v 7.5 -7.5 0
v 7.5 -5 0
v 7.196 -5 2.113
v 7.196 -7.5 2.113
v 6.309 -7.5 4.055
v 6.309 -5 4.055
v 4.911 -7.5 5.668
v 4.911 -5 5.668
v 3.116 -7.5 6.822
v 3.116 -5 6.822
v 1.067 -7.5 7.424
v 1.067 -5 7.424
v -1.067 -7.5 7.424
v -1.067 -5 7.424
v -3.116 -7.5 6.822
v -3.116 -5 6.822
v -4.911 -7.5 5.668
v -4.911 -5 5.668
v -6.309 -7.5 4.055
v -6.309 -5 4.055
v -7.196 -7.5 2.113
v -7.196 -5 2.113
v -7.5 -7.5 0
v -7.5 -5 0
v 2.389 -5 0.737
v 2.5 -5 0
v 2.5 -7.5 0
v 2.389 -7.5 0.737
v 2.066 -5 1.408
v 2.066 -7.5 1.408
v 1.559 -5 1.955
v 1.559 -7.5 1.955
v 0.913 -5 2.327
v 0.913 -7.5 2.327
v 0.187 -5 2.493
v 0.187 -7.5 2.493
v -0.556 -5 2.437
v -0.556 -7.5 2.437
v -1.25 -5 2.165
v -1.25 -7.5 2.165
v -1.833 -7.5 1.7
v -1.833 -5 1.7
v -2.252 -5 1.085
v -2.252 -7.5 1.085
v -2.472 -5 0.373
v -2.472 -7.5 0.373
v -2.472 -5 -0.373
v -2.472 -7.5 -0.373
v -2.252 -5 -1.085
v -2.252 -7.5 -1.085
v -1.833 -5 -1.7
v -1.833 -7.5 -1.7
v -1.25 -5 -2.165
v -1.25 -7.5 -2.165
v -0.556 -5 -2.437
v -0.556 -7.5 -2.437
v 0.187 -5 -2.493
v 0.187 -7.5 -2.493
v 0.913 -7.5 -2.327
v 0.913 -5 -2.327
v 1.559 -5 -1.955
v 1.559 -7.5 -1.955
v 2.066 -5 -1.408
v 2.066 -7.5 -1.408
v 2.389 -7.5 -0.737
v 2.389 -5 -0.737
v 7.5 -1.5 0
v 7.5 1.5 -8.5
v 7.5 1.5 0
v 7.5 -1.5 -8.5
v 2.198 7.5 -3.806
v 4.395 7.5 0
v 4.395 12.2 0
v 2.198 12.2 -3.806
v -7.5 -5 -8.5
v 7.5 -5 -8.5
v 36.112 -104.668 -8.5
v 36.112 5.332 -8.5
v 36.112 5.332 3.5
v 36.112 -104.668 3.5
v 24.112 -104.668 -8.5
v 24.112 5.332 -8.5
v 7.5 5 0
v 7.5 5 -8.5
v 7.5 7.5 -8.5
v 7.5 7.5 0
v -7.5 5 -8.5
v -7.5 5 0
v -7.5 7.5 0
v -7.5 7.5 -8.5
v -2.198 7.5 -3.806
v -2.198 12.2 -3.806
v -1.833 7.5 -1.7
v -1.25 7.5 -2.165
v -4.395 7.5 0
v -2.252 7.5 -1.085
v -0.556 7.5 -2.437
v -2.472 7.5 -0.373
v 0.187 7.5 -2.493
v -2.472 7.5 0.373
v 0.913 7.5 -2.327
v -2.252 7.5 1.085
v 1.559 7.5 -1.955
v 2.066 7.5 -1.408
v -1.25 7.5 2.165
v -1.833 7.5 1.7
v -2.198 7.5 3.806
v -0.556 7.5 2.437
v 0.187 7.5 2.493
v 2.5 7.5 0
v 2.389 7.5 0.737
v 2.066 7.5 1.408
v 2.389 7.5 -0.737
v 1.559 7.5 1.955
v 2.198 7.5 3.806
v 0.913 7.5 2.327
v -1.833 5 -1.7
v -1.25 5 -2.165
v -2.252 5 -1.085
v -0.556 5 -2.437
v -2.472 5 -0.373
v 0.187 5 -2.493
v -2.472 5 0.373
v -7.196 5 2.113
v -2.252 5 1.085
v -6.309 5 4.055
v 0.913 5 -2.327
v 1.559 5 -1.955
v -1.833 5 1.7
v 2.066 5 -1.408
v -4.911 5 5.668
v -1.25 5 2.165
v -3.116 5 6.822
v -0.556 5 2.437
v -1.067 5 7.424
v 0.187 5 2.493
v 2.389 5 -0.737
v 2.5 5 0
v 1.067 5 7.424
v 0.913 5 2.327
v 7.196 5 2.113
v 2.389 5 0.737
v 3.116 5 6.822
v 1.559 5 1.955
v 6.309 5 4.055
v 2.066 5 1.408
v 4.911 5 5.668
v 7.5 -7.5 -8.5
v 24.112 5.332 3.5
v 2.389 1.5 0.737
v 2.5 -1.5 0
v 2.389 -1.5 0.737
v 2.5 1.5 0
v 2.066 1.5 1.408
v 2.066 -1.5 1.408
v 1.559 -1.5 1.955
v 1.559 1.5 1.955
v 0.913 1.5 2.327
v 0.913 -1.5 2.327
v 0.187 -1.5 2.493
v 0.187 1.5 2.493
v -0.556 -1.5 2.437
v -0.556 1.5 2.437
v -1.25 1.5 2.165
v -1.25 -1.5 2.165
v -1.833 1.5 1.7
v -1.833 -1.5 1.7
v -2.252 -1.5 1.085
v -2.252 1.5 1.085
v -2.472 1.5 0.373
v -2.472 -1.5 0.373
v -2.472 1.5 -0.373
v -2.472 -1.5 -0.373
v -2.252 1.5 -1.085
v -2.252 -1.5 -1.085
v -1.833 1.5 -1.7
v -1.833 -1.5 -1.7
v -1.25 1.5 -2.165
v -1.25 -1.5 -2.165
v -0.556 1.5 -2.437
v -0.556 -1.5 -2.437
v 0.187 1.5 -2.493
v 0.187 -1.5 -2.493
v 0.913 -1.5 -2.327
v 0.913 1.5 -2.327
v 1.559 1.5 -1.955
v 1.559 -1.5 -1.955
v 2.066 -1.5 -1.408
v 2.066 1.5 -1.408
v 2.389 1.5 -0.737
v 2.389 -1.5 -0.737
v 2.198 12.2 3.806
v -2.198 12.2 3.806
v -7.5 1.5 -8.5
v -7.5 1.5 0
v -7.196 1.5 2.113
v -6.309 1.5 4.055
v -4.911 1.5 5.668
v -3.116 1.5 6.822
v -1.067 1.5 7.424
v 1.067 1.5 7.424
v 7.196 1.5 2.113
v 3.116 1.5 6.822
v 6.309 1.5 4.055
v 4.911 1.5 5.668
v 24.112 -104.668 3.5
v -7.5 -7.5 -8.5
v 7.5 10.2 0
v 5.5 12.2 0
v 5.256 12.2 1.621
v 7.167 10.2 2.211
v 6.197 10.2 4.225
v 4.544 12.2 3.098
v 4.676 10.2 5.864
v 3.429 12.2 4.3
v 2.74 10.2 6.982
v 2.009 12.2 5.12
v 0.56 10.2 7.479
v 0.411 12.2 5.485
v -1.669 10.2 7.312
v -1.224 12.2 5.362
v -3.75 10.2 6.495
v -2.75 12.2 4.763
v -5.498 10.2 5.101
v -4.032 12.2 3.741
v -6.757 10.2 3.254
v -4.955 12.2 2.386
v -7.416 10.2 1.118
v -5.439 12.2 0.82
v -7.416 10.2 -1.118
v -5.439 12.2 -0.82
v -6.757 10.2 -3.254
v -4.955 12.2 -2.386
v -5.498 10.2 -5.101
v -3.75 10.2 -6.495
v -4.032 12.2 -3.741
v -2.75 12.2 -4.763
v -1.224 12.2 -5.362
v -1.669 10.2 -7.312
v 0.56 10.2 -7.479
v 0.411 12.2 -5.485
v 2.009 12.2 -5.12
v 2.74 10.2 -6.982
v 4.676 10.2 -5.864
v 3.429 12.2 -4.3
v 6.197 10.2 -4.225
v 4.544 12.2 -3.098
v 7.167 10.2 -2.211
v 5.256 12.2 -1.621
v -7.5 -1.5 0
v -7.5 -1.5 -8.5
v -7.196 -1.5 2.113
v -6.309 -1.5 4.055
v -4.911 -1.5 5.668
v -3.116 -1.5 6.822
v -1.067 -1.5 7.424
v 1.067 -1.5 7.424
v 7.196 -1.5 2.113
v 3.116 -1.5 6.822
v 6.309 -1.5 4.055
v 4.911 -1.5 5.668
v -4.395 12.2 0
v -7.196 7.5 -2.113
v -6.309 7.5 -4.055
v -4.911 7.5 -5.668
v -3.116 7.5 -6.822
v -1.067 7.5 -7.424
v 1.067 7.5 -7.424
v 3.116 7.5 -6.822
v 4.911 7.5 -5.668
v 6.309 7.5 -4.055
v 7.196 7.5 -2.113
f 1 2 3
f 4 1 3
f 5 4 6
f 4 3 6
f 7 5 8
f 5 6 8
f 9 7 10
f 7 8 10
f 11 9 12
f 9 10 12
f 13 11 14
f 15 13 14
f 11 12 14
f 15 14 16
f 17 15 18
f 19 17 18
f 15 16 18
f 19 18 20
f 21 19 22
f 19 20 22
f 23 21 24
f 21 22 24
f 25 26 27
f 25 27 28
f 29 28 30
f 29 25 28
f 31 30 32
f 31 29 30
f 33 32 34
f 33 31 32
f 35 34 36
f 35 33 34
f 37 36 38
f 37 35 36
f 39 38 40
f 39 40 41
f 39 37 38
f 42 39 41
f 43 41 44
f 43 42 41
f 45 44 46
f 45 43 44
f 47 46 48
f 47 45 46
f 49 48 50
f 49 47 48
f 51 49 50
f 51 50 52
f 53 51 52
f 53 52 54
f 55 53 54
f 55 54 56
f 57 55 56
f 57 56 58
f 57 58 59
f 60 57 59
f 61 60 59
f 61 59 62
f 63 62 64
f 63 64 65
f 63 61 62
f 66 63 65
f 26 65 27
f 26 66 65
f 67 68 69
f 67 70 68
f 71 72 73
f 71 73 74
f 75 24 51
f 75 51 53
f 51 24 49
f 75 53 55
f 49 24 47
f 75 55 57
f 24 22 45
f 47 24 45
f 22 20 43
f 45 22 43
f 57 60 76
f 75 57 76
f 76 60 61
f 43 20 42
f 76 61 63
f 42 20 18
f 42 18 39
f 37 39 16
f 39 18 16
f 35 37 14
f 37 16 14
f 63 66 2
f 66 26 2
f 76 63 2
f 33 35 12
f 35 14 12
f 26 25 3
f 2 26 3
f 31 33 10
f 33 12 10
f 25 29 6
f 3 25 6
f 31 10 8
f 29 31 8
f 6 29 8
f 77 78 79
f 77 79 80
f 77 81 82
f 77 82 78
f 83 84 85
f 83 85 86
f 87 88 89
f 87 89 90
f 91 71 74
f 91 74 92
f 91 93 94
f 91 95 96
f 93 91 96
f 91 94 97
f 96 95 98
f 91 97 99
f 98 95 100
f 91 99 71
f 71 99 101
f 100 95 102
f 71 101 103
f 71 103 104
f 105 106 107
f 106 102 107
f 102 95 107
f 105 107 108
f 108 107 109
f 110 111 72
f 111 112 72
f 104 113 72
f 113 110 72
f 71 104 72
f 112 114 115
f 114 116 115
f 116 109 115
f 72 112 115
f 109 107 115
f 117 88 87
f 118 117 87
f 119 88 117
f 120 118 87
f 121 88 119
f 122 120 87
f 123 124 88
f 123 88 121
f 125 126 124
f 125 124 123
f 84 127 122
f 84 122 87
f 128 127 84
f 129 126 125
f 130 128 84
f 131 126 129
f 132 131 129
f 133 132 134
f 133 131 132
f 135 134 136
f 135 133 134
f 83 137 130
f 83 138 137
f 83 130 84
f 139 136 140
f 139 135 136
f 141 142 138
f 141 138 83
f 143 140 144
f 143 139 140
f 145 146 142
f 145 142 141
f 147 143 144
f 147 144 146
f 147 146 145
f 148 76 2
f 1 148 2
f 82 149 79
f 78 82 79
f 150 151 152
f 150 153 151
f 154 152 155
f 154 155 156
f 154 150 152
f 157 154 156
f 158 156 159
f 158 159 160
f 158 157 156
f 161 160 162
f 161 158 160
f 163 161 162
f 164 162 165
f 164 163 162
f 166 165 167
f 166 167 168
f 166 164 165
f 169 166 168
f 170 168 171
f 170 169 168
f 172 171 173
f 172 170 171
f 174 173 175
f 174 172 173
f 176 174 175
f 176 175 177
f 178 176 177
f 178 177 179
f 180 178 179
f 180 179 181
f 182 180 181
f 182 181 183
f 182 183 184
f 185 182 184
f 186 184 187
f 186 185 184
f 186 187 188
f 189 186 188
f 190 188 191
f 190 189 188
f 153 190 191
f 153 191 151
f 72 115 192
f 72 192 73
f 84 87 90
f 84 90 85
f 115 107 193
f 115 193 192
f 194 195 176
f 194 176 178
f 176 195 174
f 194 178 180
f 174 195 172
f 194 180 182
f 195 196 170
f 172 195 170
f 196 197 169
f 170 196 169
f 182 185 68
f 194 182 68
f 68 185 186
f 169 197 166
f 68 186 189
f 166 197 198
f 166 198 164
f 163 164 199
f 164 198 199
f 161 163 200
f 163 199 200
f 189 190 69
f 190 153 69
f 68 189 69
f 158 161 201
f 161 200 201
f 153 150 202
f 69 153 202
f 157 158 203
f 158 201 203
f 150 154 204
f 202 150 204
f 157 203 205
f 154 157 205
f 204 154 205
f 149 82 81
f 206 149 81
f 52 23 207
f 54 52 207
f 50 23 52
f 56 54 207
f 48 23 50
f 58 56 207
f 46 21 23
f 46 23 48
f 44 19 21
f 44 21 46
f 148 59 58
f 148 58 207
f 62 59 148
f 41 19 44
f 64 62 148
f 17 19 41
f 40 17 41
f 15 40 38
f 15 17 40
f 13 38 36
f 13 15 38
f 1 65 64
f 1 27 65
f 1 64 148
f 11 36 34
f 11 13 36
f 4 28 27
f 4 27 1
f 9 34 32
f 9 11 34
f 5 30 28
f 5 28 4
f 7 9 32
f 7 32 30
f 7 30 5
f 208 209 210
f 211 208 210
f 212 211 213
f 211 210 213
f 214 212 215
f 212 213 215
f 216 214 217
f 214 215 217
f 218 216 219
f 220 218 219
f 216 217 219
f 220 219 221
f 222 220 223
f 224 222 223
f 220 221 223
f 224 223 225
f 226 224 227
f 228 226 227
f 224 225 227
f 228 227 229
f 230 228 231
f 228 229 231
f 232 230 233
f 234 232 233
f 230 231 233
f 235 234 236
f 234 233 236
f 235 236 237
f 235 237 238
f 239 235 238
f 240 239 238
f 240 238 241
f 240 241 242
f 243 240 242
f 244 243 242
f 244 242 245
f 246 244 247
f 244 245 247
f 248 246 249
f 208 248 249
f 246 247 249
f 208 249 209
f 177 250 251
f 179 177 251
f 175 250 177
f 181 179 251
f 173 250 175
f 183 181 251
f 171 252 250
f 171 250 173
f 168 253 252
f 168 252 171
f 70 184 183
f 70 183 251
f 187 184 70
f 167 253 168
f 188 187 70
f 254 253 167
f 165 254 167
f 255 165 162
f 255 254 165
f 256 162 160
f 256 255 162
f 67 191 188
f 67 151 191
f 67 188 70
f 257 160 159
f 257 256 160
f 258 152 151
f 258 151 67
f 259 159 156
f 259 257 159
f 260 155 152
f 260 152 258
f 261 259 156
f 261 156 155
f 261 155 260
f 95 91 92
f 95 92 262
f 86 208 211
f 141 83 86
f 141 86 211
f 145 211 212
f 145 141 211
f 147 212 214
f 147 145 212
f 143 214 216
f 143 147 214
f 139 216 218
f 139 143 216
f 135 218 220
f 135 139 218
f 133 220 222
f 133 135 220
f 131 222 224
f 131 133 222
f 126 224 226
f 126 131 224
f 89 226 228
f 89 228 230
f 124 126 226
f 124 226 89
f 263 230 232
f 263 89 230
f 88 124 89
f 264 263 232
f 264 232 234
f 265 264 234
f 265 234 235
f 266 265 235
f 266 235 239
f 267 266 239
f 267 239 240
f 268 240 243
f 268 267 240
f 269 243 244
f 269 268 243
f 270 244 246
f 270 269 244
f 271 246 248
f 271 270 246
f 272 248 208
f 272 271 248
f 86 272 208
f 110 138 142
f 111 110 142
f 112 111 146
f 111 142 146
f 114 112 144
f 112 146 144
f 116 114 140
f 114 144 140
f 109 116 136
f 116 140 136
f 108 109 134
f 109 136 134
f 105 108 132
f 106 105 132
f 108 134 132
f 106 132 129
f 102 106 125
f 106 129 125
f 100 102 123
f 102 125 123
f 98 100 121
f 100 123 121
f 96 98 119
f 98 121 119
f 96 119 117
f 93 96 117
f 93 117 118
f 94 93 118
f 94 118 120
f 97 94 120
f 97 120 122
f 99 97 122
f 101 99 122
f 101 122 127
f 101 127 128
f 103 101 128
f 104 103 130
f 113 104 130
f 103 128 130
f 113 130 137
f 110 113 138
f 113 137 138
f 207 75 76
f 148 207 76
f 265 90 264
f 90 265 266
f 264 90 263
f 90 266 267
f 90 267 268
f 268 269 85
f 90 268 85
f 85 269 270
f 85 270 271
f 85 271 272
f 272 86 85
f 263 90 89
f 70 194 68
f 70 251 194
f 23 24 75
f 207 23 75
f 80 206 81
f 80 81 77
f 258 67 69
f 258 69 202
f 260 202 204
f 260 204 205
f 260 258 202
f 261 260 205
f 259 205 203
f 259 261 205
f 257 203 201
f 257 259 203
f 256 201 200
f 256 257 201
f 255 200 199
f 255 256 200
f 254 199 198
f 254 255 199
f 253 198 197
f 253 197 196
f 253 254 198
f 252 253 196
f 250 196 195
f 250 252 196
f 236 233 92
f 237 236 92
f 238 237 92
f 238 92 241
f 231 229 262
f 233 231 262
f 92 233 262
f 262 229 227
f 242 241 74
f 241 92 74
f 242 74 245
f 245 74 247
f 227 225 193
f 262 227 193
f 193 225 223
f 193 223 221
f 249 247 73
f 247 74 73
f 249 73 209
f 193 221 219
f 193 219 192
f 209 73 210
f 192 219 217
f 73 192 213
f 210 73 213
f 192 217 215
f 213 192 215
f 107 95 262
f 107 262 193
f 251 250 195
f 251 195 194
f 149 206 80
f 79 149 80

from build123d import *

# Parameters (mm, degrees)
F0_R     = 2.5
F1_DEPTH = 1.5
F2_START = 5
F2_DEPTH = 2.5
F3_START = -5
F3_DEPTH = 2.5
F4_START = -7.5
F4_DEPTH = 4.7
F5_SIZE  = 2
F6_W     = 12
F6_H     = 110
F7_DEPTH = 12


with BuildPart() as f1:
    # F0 (on Front) → F1 (new body, symmetric)
    with BuildSketch(Plane.XZ):
        with BuildLine():
            Line((7.5, -8.5), (7.5, 0))
            ThreePointArc((7.5, 0), (0, -7.5), (-7.5, 0))
            Line((-7.5, 0), (-7.5, -8.5))
            Line((-7.5, -8.5), (7.5, -8.5))
        make_face()
        with BuildLine():
            ThreePointArc((-7.5, 0), (0, -7.5), (7.5, 0))
            ThreePointArc((7.5, 0), (0, 7.5), (-7.5, 0))
        make_face()
        Polygon((2.1975, 3.8061816496), (4.395, 0), (2.1975, -3.8061816496), (-2.1975, -3.8061816496), (-4.395, 0), (-2.1975, 3.8061816496), align=None, mode=Mode.SUBTRACT)
        Polygon((2.1975, -3.8061816496), (4.395, 0), (2.1975, 3.8061816496), (-2.1975, 3.8061816496), (-4.395, 0), (-2.1975, -3.8061816496), align=None)
        Circle(F0_R, mode=Mode.SUBTRACT)
    extrude(amount=F1_DEPTH, both=True)


with BuildPart() as f2:
    # F0 (on Front) → F2 (new body)
    with BuildSketch(Plane.XZ.offset(F2_START)):
        with BuildLine():
            Line((7.5, -8.5), (7.5, 0))
            ThreePointArc((7.5, 0), (0, -7.5), (-7.5, 0))
            Line((-7.5, 0), (-7.5, -8.5))
            Line((-7.5, -8.5), (7.5, -8.5))
        make_face()
        with BuildLine():
            ThreePointArc((-7.5, 0), (0, -7.5), (7.5, 0))
            ThreePointArc((7.5, 0), (0, 7.5), (-7.5, 0))
        make_face()
        Polygon((2.1975, 3.8061816496), (4.395, 0), (2.1975, -3.8061816496), (-2.1975, -3.8061816496), (-4.395, 0), (-2.1975, 3.8061816496), align=None, mode=Mode.SUBTRACT)
        Polygon((2.1975, -3.8061816496), (4.395, 0), (2.1975, 3.8061816496), (-2.1975, 3.8061816496), (-4.395, 0), (-2.1975, -3.8061816496), align=None)
        Circle(F0_R, mode=Mode.SUBTRACT)
    extrude(amount=F2_DEPTH)


with BuildPart() as f3:
    # F0 (on Front) → F3 (new body)
    with BuildSketch(Plane.XZ.offset(F3_START)):
        with BuildLine():
            ThreePointArc((-7.5, 0), (0, -7.5), (7.5, 0))
            ThreePointArc((7.5, 0), (0, 7.5), (-7.5, 0))
        make_face()
        Polygon((2.1975, 3.8061816496), (4.395, 0), (2.1975, -3.8061816496), (-2.1975, -3.8061816496), (-4.395, 0), (-2.1975, 3.8061816496), align=None, mode=Mode.SUBTRACT)
        with BuildLine():
            Line((7.5, -8.5), (7.5, 0))
            ThreePointArc((7.5, 0), (0, -7.5), (-7.5, 0))
            Line((-7.5, 0), (-7.5, -8.5))
            Line((-7.5, -8.5), (7.5, -8.5))
        make_face()
        Polygon((2.1975, -3.8061816496), (4.395, 0), (2.1975, 3.8061816496), (-2.1975, 3.8061816496), (-4.395, 0), (-2.1975, -3.8061816496), align=None)
        Circle(F0_R, mode=Mode.SUBTRACT)
    extrude(amount=-F3_DEPTH)

    # F0 (on Front) → F4 (join)
    with BuildSketch(Plane.XZ.offset(F4_START)):
        with BuildLine():
            ThreePointArc((-7.5, 0), (0, -7.5), (7.5, 0))
            ThreePointArc((7.5, 0), (0, 7.5), (-7.5, 0))
        make_face()
        Polygon((2.1975, 3.8061816496), (4.395, 0), (2.1975, -3.8061816496), (-2.1975, -3.8061816496), (-4.395, 0), (-2.1975, 3.8061816496), align=None, mode=Mode.SUBTRACT)
    extrude(amount=-F4_DEPTH)

    # F5
    f5_edges = [f3.edges().sort_by_distance(p)[0] for p in [
        (-7.5, 12.2, 0),
    ]]
    chamfer(f5_edges, length=F5_SIZE)


with BuildPart() as f7:
    # F6 (on face) → F7 (new body)
    with BuildSketch(Plane(origin=(0, 0, -8.5), x_dir=(1, 0, 0), z_dir=(0, 0, -1))):
        with Locations((30.112095125, 49.667571038)):
            Rectangle(F6_W, F6_H)
    extrude(amount=-F7_DEPTH)


solid = Compound([f1.part, f2.part, f3.part, f7.part])
